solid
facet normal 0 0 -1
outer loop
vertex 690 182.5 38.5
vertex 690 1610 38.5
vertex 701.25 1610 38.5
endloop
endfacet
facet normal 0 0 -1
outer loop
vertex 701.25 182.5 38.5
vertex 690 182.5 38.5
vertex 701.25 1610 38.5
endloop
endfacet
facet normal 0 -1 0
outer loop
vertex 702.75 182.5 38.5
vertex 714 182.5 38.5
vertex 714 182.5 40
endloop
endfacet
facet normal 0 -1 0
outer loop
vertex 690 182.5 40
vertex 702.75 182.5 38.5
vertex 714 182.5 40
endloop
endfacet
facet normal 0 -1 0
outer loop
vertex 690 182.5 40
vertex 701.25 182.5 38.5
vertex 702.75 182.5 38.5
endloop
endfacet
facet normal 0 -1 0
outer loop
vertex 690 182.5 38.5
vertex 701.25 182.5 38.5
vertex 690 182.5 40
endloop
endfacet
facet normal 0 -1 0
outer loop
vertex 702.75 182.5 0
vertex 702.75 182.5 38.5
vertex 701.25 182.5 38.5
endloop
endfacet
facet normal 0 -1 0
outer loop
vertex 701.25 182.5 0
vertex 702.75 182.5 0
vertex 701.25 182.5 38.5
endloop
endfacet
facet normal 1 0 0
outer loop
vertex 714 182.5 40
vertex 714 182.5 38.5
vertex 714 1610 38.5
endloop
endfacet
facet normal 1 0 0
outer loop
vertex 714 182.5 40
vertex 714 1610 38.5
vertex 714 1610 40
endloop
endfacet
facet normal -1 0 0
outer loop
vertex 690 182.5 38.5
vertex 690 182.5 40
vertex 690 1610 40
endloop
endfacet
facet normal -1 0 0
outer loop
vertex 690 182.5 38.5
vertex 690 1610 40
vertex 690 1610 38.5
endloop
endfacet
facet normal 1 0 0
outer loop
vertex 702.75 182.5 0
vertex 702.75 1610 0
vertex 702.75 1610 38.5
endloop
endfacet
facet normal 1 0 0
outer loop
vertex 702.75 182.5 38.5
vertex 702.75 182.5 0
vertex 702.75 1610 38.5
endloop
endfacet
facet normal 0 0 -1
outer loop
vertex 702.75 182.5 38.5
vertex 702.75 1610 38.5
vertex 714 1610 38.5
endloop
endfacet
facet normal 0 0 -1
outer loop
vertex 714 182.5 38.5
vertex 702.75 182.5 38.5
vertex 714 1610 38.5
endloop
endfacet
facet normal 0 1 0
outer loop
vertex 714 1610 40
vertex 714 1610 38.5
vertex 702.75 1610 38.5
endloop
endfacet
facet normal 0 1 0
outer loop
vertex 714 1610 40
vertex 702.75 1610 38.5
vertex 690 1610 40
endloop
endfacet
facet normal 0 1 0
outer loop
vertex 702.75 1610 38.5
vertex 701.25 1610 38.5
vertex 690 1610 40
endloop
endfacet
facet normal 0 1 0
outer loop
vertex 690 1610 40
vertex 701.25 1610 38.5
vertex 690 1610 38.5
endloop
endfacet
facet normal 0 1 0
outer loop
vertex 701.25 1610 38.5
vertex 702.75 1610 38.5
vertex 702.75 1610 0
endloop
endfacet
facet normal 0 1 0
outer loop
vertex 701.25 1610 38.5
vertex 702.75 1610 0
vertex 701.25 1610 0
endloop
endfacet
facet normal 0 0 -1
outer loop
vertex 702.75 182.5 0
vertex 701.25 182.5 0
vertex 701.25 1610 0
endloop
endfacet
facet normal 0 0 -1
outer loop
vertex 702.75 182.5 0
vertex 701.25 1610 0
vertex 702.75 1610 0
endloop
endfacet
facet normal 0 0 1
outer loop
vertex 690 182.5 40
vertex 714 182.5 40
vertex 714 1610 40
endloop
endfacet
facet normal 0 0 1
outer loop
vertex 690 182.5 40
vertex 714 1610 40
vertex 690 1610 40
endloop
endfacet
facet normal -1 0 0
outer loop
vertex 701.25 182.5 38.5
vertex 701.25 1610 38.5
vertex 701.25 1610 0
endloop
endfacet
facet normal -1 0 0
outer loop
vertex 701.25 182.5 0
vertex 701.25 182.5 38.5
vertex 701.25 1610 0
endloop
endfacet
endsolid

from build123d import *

# Parameters (mm, degrees)
STORE_SOVE_ORTA_1_START = 182.5
STORE_SOVE_ORTA_1_DEPTH = 1427.5


with BuildPart() as part:
    # Sketch1 → STORE_sove_orta_1 (new body)
    with BuildSketch(Plane(origin=(0, 0, 0), x_dir=(1, 0, 0), z_dir=(0, 1, 0)).offset(STORE_SOVE_ORTA_1_START)):
        Polygon((690, -40), (690, -38.5), (701.25, -38.5), (701.25, 0), (702.75, 0), (702.75, -38.5), (714, -38.5), (714, -40), align=None)
    extrude(amount=STORE_SOVE_ORTA_1_DEPTH)


solid = part.part
